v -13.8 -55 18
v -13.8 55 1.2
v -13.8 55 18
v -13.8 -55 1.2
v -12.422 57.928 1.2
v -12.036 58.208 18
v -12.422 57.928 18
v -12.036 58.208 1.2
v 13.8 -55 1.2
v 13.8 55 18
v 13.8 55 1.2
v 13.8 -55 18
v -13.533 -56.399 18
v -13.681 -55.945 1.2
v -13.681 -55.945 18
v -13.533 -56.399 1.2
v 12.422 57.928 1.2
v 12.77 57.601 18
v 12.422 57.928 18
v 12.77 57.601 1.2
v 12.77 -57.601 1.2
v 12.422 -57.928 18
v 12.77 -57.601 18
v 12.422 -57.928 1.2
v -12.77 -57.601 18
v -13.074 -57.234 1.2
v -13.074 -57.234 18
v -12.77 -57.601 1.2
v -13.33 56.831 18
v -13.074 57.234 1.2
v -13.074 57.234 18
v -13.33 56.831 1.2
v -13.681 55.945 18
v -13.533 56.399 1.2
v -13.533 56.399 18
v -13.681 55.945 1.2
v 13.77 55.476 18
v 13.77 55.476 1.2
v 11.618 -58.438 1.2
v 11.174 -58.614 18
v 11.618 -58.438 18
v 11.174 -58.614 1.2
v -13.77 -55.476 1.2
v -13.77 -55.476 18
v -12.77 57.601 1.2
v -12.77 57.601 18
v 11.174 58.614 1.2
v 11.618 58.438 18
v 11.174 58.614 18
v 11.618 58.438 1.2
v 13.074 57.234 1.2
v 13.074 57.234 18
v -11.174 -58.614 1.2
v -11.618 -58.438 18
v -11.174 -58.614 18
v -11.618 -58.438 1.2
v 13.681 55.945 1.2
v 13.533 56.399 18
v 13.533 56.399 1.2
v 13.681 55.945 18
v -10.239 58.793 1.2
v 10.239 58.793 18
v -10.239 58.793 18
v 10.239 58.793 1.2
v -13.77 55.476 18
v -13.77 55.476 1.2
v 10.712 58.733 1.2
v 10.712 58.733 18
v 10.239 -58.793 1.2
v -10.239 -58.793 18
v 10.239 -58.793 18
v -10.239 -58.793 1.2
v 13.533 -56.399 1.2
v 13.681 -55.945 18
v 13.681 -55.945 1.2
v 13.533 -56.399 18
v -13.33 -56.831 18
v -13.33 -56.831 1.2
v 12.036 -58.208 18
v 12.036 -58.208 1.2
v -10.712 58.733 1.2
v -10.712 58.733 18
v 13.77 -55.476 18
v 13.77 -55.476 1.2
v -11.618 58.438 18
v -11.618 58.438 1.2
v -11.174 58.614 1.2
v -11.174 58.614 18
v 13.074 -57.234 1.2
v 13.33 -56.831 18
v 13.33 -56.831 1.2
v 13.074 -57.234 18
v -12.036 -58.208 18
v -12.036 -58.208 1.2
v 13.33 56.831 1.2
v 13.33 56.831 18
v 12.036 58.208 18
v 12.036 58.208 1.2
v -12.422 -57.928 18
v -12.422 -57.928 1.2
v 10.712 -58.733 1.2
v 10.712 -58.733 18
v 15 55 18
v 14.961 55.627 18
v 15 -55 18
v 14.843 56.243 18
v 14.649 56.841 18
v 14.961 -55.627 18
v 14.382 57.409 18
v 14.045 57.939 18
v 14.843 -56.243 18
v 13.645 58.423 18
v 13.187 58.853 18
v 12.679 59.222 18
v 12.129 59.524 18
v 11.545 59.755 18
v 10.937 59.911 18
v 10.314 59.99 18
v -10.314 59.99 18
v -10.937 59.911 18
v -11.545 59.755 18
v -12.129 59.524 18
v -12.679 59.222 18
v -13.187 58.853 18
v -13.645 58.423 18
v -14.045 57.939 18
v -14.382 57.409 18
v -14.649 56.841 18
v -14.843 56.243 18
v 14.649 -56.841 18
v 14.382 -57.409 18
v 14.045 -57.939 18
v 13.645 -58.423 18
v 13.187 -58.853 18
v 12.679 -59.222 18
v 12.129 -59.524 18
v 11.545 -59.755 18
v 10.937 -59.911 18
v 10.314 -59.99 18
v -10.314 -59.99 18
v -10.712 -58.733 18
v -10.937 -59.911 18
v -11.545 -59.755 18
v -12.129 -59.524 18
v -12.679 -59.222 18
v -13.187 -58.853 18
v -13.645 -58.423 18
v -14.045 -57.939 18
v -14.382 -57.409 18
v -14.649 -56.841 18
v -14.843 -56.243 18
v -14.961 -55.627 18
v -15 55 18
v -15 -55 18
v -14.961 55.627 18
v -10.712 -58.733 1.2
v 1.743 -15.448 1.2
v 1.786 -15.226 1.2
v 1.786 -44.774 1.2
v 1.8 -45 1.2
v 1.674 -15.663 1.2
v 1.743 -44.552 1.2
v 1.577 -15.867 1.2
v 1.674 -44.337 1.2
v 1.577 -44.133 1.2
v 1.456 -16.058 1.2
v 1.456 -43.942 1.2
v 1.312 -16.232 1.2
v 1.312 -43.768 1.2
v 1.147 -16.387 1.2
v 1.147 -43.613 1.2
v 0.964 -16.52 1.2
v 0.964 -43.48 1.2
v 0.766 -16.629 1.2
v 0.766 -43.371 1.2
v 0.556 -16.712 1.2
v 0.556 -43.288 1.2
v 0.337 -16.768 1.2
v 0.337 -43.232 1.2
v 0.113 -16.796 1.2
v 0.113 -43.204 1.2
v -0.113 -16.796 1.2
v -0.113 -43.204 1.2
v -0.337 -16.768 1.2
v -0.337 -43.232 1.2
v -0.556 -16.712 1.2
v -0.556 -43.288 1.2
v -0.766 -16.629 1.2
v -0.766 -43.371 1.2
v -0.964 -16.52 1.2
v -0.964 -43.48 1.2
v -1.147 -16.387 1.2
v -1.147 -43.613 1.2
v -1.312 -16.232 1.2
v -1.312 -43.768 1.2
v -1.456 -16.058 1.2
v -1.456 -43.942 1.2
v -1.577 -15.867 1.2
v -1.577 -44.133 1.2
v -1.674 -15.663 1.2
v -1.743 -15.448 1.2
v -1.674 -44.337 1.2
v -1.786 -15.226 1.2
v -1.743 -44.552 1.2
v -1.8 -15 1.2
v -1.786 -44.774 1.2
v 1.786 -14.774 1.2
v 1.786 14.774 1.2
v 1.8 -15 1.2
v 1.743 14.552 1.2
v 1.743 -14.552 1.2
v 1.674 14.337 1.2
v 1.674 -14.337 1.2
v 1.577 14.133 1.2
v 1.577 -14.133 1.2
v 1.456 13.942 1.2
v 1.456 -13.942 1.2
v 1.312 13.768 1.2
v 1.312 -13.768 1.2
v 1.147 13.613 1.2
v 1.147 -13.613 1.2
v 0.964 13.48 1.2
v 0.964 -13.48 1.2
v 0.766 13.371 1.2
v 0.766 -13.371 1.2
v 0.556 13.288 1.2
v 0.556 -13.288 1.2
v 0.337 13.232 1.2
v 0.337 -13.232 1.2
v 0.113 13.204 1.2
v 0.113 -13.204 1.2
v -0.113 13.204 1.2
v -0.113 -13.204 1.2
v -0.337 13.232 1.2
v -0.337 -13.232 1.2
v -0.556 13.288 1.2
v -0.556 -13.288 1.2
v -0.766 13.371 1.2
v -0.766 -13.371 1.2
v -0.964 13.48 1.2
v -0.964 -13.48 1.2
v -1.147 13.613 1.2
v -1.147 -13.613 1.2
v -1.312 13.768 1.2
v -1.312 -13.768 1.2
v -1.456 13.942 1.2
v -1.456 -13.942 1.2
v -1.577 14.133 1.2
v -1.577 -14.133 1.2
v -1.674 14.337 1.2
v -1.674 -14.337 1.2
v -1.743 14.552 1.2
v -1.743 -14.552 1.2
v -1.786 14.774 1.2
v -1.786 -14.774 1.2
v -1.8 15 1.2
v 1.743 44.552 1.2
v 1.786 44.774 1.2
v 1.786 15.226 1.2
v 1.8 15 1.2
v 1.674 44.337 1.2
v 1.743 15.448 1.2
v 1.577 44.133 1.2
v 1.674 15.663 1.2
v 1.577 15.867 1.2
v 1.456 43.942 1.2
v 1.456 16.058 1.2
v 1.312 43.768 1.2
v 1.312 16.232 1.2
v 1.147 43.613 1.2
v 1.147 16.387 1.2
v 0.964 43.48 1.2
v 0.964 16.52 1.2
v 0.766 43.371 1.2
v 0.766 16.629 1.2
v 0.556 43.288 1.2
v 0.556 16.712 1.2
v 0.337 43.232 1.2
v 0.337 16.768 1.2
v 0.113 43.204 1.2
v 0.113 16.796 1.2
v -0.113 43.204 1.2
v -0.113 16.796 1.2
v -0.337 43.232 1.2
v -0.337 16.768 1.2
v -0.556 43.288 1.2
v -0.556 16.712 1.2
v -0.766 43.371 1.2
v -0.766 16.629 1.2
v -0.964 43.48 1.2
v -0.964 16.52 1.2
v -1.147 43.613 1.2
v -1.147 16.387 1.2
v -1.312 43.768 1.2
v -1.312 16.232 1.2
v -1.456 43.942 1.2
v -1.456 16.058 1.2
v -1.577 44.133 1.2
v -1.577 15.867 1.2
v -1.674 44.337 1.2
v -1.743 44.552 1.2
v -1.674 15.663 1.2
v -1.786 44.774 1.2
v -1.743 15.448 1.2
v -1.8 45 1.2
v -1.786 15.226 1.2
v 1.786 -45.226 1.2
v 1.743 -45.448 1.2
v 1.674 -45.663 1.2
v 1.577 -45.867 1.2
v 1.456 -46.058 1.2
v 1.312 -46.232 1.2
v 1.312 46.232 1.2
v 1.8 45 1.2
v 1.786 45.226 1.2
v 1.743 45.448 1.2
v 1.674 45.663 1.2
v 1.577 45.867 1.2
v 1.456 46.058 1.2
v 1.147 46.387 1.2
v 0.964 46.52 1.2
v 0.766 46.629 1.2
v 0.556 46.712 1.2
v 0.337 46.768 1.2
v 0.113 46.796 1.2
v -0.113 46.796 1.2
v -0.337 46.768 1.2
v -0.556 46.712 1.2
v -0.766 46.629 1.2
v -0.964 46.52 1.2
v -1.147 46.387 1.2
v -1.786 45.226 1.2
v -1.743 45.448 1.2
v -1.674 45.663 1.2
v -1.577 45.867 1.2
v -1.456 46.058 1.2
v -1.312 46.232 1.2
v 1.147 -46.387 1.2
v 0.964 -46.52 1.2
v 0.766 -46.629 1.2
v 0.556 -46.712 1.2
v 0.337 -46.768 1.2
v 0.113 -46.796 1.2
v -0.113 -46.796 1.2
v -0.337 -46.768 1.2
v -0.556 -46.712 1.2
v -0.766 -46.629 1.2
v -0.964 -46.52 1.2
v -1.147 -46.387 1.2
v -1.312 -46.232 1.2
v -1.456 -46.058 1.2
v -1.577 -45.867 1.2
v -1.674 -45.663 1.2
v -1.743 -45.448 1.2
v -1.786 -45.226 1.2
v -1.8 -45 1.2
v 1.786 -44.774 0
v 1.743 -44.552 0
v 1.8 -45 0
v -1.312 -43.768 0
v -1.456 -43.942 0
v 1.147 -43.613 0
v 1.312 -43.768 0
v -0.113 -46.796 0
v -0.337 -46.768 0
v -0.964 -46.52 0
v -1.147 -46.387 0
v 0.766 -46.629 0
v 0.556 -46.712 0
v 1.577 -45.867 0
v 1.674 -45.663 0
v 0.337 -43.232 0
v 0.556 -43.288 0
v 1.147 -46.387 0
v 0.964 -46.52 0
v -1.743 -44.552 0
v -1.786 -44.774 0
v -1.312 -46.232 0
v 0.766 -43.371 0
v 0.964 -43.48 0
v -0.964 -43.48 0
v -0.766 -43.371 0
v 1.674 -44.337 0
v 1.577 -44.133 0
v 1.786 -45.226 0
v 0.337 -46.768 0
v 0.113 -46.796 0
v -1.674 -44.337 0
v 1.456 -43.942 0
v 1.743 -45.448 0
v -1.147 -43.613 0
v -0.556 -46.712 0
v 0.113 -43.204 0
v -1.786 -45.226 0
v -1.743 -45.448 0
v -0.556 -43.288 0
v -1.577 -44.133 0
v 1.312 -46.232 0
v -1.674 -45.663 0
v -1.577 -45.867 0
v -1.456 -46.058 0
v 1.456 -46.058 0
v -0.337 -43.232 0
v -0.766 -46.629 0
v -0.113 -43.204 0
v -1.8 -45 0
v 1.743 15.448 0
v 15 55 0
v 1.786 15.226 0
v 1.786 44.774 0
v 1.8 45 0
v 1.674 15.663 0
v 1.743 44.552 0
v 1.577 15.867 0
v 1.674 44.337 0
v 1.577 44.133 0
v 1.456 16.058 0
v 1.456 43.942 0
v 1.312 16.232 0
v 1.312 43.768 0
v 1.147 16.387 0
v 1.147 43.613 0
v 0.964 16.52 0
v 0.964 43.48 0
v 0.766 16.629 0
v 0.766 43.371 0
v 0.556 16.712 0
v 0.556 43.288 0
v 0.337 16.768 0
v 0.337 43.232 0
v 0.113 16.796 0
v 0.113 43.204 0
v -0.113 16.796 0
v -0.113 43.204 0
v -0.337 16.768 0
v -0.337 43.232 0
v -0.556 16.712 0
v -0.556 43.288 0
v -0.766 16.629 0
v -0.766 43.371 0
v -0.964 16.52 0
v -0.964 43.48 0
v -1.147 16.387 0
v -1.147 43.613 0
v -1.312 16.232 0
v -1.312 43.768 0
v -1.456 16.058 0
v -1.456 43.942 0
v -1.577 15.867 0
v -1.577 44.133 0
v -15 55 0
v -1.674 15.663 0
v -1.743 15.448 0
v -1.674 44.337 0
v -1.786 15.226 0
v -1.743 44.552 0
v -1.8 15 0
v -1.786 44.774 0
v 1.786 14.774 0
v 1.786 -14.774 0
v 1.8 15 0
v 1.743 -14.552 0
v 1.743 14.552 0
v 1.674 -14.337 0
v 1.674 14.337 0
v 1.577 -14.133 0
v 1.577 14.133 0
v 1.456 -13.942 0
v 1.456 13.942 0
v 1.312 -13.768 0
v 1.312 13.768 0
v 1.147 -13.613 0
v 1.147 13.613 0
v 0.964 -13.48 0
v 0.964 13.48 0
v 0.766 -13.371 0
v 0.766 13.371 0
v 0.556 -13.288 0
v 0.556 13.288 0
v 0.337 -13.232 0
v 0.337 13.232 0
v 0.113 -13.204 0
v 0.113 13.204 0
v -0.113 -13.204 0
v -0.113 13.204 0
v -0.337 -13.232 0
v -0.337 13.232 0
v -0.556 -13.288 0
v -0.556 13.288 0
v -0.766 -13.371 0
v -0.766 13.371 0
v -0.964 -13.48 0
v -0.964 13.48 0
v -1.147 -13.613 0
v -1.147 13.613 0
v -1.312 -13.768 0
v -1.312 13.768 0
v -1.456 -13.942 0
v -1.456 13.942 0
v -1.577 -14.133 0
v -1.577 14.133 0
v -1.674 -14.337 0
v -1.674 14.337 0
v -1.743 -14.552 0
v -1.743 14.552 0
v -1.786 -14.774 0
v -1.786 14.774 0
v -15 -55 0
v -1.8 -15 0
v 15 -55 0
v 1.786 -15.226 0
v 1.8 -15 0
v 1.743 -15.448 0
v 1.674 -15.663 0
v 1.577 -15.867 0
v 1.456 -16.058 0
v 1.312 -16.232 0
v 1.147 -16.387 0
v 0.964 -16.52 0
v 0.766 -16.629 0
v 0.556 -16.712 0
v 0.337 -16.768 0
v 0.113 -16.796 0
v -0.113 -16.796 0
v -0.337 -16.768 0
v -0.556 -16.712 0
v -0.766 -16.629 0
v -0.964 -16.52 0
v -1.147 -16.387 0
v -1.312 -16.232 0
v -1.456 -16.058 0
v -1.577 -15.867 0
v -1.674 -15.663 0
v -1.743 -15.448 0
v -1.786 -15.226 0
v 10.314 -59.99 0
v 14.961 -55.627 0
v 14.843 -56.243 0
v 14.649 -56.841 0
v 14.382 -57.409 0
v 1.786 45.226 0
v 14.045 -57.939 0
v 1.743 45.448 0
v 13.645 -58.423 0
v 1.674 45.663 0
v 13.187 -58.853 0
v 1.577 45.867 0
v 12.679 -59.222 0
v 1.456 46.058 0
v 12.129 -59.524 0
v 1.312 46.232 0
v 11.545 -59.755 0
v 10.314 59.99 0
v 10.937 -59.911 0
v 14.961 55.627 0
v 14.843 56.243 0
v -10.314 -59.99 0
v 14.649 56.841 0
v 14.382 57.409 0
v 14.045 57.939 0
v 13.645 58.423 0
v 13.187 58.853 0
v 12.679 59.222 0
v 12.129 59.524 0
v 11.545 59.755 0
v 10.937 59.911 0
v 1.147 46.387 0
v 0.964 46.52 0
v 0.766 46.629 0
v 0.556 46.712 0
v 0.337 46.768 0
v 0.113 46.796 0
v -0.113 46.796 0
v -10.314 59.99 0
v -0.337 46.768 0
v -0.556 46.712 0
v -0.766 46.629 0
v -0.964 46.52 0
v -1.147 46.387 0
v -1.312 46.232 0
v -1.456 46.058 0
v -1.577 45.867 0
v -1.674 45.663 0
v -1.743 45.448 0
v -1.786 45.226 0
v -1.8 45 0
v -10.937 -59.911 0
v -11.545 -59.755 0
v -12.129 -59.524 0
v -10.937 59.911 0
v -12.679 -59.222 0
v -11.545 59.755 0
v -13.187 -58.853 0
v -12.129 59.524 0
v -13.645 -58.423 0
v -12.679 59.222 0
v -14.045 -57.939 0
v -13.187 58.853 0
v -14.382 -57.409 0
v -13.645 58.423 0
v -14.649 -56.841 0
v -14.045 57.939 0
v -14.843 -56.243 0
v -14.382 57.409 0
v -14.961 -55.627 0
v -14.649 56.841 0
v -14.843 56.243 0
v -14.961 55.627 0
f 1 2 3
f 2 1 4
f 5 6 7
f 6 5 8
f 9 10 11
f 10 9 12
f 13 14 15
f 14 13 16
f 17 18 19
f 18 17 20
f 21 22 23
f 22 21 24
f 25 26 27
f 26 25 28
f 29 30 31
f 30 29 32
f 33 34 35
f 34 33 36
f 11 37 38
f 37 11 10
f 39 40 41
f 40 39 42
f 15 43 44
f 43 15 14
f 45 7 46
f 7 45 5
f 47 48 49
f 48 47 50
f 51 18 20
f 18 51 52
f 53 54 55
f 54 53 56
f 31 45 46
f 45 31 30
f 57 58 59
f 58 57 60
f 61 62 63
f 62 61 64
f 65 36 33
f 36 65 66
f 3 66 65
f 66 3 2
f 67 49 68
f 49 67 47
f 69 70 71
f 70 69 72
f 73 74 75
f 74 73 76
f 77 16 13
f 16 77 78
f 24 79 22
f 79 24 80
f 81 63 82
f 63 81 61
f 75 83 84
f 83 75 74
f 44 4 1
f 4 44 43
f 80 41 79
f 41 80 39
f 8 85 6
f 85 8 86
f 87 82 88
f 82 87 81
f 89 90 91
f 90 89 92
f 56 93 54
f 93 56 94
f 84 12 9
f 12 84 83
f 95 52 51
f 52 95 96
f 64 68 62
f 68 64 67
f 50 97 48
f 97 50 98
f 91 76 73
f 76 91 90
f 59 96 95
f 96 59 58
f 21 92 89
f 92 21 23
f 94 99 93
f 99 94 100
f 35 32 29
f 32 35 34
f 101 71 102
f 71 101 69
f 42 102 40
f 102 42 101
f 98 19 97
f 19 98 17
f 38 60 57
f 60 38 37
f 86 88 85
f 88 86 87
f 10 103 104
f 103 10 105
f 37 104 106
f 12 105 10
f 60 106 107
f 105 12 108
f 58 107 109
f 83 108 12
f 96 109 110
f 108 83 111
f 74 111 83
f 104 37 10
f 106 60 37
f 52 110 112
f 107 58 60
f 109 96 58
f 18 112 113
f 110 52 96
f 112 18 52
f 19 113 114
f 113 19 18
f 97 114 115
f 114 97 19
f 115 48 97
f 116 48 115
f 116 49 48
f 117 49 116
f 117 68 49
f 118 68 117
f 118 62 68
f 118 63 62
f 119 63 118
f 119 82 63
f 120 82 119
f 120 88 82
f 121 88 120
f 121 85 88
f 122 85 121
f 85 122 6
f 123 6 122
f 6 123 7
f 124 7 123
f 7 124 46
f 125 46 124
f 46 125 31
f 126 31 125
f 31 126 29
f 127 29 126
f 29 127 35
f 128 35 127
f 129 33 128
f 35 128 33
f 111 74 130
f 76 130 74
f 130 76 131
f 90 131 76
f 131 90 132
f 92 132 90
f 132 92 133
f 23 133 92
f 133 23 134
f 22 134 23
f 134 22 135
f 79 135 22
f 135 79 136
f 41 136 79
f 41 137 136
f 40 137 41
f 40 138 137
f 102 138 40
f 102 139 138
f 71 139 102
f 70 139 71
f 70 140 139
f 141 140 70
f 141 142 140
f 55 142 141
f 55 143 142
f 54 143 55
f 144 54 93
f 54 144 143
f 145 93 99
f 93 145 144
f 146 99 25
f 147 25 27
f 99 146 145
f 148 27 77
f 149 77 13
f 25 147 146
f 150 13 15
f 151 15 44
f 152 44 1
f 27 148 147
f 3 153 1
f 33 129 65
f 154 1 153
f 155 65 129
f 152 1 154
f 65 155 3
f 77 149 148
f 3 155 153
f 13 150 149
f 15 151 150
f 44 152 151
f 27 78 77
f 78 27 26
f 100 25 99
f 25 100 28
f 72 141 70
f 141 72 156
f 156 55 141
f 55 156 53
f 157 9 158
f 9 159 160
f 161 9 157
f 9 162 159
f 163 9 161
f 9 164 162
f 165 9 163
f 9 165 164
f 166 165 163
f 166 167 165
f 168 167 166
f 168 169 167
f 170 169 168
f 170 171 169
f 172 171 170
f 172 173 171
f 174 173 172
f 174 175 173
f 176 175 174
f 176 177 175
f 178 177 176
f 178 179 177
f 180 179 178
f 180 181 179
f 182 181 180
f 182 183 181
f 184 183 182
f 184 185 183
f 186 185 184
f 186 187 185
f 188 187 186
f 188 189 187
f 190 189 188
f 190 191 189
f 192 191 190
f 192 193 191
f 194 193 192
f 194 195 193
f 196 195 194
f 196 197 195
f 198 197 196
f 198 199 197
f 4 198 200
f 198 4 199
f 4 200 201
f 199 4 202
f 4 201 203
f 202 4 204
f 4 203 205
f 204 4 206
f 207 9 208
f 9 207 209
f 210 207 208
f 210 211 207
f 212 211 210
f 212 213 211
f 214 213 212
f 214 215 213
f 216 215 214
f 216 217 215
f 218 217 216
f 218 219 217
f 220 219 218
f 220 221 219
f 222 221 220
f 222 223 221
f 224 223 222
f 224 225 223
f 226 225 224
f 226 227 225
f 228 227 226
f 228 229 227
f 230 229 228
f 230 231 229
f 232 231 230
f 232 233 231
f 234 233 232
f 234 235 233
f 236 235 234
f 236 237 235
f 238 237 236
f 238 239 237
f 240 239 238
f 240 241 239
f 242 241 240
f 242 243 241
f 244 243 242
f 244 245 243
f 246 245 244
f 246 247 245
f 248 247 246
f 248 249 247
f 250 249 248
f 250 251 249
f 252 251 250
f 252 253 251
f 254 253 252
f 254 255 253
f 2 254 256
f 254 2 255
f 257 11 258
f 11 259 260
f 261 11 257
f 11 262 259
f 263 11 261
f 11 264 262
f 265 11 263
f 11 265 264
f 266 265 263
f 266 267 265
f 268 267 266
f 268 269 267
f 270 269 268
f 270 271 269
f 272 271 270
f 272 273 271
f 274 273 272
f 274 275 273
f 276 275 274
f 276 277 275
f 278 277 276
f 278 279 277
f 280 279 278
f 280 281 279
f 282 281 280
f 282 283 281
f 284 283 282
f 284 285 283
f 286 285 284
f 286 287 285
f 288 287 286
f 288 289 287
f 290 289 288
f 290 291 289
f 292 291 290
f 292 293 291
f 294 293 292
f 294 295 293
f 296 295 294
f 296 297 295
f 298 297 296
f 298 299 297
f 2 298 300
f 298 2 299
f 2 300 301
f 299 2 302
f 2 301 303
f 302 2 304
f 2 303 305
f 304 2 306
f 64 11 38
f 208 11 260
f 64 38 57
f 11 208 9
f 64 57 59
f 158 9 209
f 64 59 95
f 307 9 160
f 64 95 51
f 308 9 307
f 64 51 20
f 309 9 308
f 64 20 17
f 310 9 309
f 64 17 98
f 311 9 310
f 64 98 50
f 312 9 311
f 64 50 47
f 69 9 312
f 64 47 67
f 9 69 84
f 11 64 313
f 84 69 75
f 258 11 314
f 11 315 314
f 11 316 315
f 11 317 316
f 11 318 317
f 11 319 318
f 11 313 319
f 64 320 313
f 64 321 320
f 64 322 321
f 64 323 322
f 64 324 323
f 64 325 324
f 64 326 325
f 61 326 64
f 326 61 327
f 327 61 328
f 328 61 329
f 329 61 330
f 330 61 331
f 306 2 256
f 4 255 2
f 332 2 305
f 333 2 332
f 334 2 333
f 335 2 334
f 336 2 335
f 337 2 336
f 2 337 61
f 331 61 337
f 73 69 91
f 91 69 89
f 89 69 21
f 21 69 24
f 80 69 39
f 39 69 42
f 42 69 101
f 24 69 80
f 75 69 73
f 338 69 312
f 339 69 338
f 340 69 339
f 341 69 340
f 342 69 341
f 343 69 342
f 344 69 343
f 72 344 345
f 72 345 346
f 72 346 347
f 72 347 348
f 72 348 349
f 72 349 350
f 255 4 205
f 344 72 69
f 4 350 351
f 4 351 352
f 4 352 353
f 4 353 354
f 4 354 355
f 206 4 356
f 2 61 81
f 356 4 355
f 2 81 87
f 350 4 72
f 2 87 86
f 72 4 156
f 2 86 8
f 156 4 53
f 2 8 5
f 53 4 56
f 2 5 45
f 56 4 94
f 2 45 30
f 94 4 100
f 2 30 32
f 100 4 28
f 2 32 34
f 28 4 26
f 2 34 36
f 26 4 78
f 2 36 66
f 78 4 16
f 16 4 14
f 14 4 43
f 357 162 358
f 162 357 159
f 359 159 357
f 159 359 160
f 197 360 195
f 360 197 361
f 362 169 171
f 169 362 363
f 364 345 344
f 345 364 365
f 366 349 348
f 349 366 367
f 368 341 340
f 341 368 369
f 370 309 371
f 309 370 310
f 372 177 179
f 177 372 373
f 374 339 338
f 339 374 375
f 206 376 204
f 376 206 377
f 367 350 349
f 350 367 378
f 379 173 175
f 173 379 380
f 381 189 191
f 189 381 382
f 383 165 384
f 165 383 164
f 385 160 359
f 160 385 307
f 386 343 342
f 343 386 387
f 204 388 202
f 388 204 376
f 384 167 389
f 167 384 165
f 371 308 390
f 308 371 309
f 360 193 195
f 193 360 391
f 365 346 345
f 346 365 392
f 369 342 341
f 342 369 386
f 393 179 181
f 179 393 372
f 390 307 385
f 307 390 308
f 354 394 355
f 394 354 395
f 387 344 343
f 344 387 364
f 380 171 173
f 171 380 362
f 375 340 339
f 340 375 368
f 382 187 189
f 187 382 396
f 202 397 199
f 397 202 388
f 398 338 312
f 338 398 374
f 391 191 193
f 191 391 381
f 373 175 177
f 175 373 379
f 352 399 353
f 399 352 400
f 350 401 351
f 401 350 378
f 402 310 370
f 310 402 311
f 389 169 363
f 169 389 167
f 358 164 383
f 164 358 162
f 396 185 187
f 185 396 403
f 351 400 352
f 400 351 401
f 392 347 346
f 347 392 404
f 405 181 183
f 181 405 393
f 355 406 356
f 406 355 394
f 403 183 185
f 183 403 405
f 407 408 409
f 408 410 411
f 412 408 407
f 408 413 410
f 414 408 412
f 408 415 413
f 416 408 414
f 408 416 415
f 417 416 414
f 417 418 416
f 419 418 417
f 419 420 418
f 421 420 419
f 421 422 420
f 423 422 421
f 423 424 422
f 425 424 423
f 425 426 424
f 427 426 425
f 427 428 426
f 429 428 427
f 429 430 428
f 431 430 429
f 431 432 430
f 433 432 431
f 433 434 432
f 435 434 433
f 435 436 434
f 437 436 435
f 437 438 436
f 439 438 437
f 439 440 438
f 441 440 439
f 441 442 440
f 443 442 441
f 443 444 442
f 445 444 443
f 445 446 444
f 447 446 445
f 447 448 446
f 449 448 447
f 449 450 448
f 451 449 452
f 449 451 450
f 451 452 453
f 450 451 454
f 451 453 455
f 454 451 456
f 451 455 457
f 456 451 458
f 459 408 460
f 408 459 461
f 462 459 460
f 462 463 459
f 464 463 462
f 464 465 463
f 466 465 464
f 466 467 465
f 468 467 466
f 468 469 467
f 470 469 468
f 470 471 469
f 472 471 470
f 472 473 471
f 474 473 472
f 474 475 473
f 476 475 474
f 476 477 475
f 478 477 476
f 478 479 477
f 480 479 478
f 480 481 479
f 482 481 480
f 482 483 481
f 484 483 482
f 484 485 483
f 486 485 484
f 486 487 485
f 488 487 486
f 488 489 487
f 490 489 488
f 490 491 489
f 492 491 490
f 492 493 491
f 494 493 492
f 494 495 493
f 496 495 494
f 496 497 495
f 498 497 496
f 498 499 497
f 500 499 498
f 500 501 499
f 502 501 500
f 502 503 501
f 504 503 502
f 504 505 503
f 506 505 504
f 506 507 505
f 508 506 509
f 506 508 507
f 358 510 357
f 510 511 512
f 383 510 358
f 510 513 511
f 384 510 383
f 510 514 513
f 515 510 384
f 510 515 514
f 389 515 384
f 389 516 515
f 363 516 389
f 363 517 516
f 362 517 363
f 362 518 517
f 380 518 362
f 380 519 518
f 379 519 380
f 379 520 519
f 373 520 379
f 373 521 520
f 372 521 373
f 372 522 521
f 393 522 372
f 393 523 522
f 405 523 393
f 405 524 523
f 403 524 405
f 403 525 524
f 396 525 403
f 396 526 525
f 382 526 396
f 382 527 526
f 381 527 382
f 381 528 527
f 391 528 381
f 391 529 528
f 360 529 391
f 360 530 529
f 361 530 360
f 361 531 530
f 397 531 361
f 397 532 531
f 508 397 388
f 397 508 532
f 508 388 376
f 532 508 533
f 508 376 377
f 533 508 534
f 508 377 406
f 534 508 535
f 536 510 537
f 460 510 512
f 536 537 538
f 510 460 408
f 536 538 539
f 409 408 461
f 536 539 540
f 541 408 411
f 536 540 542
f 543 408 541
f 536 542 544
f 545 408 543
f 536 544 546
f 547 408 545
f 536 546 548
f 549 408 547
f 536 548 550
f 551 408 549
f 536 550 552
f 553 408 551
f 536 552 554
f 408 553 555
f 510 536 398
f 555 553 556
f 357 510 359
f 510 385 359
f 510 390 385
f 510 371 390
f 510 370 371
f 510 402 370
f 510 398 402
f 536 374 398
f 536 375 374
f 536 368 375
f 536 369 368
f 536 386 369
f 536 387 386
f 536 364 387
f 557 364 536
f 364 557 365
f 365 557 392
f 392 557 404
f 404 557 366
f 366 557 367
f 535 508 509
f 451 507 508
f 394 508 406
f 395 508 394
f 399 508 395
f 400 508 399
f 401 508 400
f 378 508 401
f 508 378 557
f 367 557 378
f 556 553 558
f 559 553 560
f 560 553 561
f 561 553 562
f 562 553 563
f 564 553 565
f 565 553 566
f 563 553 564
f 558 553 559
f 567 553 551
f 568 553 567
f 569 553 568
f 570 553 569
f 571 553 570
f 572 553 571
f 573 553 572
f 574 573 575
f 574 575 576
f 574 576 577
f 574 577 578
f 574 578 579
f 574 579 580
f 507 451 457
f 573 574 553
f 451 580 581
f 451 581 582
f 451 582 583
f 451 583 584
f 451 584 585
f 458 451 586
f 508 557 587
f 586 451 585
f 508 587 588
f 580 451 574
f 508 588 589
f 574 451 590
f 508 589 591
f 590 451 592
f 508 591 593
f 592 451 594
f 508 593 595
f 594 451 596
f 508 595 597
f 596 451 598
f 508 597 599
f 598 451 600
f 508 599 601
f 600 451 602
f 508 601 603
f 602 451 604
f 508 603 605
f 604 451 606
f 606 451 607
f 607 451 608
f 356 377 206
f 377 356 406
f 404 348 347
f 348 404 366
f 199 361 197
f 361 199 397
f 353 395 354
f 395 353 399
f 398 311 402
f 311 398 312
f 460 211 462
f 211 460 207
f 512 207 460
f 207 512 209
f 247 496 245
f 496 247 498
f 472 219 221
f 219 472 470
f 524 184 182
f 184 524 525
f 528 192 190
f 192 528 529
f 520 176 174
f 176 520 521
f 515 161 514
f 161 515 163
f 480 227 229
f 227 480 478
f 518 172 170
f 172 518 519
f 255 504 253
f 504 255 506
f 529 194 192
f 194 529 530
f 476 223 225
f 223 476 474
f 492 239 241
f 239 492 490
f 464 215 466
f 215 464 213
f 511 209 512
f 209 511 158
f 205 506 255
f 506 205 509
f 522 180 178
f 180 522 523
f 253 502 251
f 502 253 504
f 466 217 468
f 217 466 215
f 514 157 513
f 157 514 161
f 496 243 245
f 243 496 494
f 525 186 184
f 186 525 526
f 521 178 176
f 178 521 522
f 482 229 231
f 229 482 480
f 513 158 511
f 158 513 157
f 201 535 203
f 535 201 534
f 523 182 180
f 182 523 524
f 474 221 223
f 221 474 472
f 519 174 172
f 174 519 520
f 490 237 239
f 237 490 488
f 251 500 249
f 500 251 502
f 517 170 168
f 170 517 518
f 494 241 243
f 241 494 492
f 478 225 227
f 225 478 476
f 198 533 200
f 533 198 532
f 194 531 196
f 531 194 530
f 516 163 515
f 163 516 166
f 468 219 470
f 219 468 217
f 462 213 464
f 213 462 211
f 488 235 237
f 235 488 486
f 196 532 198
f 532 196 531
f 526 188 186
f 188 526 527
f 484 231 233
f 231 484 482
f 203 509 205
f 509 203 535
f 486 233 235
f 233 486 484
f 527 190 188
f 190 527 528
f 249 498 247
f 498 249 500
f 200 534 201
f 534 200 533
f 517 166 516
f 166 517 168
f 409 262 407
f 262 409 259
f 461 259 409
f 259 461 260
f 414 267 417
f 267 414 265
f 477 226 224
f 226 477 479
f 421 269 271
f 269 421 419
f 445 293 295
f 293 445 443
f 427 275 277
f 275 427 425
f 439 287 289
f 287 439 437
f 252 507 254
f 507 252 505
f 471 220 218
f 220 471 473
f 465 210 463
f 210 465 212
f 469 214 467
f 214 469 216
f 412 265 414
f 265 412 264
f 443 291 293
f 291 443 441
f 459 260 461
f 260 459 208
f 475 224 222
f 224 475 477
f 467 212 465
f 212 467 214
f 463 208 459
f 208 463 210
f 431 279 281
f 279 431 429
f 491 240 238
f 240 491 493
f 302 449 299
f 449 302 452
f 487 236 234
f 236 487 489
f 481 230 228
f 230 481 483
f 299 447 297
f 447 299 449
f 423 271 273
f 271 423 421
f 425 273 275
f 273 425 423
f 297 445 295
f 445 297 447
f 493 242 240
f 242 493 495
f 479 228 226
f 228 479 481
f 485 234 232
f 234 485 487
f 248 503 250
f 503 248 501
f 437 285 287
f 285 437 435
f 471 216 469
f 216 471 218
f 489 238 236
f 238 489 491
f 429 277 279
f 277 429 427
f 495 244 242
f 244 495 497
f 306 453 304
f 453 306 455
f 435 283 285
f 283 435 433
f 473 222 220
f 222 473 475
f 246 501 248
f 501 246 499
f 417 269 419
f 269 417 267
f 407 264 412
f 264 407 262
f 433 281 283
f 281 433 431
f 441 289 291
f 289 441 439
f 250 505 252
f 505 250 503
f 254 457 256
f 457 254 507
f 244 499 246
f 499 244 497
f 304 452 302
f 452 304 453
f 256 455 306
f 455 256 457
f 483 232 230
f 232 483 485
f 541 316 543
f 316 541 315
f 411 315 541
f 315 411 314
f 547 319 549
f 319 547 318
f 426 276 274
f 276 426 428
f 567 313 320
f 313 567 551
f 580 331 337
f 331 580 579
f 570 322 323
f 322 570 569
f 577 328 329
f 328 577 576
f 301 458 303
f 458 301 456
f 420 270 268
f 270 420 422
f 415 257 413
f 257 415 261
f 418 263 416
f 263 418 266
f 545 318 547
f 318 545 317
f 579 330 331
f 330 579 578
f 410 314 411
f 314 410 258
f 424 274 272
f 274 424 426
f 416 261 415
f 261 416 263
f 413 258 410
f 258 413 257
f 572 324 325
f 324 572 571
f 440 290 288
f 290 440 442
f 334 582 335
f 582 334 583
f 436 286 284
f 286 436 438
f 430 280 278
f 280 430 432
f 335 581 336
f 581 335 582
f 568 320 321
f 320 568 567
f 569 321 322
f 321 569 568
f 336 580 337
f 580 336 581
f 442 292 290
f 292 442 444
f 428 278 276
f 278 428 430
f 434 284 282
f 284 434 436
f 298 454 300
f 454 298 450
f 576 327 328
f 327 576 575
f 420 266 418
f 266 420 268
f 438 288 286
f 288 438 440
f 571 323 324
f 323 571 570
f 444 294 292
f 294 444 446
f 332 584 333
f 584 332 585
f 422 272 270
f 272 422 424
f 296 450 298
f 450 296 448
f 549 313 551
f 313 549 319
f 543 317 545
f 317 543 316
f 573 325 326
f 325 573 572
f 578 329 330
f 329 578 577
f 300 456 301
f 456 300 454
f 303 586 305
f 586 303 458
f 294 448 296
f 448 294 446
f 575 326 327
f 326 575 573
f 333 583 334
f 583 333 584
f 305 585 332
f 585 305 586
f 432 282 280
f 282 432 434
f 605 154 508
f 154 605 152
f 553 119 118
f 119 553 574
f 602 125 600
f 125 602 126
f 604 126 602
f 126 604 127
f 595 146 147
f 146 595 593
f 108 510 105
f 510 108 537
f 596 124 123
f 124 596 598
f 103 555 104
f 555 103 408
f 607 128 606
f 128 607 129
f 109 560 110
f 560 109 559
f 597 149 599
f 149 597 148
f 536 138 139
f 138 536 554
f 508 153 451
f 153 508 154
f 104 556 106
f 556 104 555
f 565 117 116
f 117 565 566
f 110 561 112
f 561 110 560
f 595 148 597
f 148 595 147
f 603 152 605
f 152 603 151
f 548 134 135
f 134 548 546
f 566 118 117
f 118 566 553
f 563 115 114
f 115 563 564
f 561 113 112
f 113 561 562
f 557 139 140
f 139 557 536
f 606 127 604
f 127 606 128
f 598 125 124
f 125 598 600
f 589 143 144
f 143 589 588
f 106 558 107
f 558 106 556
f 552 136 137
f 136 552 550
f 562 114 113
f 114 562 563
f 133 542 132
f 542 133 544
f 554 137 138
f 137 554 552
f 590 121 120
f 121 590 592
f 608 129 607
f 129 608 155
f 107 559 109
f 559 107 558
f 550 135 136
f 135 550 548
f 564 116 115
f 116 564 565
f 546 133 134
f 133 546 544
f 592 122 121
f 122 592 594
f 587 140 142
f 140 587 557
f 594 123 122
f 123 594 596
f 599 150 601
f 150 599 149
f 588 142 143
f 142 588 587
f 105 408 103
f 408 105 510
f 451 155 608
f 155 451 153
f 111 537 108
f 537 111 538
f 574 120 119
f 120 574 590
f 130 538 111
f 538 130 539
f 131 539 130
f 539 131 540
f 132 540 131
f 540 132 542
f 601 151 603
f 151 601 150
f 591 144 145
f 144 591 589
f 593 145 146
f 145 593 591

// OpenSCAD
$fn = 50;


difference() {
	union() {
		hull() {
			translate(v = [-10.0000000000, 55.0000000000, 0]) {
				cylinder(h = 18, r = 5);
			}
			translate(v = [10.0000000000, 55.0000000000, 0]) {
				cylinder(h = 18, r = 5);
			}
			translate(v = [-10.0000000000, -55.0000000000, 0]) {
				cylinder(h = 18, r = 5);
			}
			translate(v = [10.0000000000, -55.0000000000, 0]) {
				cylinder(h = 18, r = 5);
			}
		}
	}
	union() {
		translate(v = [0, 0, 1.2000000000]) {
			hull() {
				translate(v = [-10.0000000000, 55.0000000000, 0]) {
					cylinder(h = 16.8000000000, r = 3.8000000000);
				}
				translate(v = [10.0000000000, 55.0000000000, 0]) {
					cylinder(h = 16.8000000000, r = 3.8000000000);
				}
				translate(v = [-10.0000000000, -55.0000000000, 0]) {
					cylinder(h = 16.8000000000, r = 3.8000000000);
				}
				translate(v = [10.0000000000, -55.0000000000, 0]) {
					cylinder(h = 16.8000000000, r = 3.8000000000);
				}
			}
		}
		#translate(v = [0.0000000000, -45.0000000000, 0]) {
			cylinder(h = 1.2000000000, r = 1.8000000000);
		}
		#translate(v = [0.0000000000, -15.0000000000, 0]) {
			cylinder(h = 1.2000000000, r = 1.8000000000);
		}
		#translate(v = [0.0000000000, 15.0000000000, 0]) {
			cylinder(h = 1.2000000000, r = 1.8000000000);
		}
		#translate(v = [0.0000000000, 45.0000000000, 0]) {
			cylinder(h = 1.2000000000, r = 1.8000000000);
		}
	}
}
